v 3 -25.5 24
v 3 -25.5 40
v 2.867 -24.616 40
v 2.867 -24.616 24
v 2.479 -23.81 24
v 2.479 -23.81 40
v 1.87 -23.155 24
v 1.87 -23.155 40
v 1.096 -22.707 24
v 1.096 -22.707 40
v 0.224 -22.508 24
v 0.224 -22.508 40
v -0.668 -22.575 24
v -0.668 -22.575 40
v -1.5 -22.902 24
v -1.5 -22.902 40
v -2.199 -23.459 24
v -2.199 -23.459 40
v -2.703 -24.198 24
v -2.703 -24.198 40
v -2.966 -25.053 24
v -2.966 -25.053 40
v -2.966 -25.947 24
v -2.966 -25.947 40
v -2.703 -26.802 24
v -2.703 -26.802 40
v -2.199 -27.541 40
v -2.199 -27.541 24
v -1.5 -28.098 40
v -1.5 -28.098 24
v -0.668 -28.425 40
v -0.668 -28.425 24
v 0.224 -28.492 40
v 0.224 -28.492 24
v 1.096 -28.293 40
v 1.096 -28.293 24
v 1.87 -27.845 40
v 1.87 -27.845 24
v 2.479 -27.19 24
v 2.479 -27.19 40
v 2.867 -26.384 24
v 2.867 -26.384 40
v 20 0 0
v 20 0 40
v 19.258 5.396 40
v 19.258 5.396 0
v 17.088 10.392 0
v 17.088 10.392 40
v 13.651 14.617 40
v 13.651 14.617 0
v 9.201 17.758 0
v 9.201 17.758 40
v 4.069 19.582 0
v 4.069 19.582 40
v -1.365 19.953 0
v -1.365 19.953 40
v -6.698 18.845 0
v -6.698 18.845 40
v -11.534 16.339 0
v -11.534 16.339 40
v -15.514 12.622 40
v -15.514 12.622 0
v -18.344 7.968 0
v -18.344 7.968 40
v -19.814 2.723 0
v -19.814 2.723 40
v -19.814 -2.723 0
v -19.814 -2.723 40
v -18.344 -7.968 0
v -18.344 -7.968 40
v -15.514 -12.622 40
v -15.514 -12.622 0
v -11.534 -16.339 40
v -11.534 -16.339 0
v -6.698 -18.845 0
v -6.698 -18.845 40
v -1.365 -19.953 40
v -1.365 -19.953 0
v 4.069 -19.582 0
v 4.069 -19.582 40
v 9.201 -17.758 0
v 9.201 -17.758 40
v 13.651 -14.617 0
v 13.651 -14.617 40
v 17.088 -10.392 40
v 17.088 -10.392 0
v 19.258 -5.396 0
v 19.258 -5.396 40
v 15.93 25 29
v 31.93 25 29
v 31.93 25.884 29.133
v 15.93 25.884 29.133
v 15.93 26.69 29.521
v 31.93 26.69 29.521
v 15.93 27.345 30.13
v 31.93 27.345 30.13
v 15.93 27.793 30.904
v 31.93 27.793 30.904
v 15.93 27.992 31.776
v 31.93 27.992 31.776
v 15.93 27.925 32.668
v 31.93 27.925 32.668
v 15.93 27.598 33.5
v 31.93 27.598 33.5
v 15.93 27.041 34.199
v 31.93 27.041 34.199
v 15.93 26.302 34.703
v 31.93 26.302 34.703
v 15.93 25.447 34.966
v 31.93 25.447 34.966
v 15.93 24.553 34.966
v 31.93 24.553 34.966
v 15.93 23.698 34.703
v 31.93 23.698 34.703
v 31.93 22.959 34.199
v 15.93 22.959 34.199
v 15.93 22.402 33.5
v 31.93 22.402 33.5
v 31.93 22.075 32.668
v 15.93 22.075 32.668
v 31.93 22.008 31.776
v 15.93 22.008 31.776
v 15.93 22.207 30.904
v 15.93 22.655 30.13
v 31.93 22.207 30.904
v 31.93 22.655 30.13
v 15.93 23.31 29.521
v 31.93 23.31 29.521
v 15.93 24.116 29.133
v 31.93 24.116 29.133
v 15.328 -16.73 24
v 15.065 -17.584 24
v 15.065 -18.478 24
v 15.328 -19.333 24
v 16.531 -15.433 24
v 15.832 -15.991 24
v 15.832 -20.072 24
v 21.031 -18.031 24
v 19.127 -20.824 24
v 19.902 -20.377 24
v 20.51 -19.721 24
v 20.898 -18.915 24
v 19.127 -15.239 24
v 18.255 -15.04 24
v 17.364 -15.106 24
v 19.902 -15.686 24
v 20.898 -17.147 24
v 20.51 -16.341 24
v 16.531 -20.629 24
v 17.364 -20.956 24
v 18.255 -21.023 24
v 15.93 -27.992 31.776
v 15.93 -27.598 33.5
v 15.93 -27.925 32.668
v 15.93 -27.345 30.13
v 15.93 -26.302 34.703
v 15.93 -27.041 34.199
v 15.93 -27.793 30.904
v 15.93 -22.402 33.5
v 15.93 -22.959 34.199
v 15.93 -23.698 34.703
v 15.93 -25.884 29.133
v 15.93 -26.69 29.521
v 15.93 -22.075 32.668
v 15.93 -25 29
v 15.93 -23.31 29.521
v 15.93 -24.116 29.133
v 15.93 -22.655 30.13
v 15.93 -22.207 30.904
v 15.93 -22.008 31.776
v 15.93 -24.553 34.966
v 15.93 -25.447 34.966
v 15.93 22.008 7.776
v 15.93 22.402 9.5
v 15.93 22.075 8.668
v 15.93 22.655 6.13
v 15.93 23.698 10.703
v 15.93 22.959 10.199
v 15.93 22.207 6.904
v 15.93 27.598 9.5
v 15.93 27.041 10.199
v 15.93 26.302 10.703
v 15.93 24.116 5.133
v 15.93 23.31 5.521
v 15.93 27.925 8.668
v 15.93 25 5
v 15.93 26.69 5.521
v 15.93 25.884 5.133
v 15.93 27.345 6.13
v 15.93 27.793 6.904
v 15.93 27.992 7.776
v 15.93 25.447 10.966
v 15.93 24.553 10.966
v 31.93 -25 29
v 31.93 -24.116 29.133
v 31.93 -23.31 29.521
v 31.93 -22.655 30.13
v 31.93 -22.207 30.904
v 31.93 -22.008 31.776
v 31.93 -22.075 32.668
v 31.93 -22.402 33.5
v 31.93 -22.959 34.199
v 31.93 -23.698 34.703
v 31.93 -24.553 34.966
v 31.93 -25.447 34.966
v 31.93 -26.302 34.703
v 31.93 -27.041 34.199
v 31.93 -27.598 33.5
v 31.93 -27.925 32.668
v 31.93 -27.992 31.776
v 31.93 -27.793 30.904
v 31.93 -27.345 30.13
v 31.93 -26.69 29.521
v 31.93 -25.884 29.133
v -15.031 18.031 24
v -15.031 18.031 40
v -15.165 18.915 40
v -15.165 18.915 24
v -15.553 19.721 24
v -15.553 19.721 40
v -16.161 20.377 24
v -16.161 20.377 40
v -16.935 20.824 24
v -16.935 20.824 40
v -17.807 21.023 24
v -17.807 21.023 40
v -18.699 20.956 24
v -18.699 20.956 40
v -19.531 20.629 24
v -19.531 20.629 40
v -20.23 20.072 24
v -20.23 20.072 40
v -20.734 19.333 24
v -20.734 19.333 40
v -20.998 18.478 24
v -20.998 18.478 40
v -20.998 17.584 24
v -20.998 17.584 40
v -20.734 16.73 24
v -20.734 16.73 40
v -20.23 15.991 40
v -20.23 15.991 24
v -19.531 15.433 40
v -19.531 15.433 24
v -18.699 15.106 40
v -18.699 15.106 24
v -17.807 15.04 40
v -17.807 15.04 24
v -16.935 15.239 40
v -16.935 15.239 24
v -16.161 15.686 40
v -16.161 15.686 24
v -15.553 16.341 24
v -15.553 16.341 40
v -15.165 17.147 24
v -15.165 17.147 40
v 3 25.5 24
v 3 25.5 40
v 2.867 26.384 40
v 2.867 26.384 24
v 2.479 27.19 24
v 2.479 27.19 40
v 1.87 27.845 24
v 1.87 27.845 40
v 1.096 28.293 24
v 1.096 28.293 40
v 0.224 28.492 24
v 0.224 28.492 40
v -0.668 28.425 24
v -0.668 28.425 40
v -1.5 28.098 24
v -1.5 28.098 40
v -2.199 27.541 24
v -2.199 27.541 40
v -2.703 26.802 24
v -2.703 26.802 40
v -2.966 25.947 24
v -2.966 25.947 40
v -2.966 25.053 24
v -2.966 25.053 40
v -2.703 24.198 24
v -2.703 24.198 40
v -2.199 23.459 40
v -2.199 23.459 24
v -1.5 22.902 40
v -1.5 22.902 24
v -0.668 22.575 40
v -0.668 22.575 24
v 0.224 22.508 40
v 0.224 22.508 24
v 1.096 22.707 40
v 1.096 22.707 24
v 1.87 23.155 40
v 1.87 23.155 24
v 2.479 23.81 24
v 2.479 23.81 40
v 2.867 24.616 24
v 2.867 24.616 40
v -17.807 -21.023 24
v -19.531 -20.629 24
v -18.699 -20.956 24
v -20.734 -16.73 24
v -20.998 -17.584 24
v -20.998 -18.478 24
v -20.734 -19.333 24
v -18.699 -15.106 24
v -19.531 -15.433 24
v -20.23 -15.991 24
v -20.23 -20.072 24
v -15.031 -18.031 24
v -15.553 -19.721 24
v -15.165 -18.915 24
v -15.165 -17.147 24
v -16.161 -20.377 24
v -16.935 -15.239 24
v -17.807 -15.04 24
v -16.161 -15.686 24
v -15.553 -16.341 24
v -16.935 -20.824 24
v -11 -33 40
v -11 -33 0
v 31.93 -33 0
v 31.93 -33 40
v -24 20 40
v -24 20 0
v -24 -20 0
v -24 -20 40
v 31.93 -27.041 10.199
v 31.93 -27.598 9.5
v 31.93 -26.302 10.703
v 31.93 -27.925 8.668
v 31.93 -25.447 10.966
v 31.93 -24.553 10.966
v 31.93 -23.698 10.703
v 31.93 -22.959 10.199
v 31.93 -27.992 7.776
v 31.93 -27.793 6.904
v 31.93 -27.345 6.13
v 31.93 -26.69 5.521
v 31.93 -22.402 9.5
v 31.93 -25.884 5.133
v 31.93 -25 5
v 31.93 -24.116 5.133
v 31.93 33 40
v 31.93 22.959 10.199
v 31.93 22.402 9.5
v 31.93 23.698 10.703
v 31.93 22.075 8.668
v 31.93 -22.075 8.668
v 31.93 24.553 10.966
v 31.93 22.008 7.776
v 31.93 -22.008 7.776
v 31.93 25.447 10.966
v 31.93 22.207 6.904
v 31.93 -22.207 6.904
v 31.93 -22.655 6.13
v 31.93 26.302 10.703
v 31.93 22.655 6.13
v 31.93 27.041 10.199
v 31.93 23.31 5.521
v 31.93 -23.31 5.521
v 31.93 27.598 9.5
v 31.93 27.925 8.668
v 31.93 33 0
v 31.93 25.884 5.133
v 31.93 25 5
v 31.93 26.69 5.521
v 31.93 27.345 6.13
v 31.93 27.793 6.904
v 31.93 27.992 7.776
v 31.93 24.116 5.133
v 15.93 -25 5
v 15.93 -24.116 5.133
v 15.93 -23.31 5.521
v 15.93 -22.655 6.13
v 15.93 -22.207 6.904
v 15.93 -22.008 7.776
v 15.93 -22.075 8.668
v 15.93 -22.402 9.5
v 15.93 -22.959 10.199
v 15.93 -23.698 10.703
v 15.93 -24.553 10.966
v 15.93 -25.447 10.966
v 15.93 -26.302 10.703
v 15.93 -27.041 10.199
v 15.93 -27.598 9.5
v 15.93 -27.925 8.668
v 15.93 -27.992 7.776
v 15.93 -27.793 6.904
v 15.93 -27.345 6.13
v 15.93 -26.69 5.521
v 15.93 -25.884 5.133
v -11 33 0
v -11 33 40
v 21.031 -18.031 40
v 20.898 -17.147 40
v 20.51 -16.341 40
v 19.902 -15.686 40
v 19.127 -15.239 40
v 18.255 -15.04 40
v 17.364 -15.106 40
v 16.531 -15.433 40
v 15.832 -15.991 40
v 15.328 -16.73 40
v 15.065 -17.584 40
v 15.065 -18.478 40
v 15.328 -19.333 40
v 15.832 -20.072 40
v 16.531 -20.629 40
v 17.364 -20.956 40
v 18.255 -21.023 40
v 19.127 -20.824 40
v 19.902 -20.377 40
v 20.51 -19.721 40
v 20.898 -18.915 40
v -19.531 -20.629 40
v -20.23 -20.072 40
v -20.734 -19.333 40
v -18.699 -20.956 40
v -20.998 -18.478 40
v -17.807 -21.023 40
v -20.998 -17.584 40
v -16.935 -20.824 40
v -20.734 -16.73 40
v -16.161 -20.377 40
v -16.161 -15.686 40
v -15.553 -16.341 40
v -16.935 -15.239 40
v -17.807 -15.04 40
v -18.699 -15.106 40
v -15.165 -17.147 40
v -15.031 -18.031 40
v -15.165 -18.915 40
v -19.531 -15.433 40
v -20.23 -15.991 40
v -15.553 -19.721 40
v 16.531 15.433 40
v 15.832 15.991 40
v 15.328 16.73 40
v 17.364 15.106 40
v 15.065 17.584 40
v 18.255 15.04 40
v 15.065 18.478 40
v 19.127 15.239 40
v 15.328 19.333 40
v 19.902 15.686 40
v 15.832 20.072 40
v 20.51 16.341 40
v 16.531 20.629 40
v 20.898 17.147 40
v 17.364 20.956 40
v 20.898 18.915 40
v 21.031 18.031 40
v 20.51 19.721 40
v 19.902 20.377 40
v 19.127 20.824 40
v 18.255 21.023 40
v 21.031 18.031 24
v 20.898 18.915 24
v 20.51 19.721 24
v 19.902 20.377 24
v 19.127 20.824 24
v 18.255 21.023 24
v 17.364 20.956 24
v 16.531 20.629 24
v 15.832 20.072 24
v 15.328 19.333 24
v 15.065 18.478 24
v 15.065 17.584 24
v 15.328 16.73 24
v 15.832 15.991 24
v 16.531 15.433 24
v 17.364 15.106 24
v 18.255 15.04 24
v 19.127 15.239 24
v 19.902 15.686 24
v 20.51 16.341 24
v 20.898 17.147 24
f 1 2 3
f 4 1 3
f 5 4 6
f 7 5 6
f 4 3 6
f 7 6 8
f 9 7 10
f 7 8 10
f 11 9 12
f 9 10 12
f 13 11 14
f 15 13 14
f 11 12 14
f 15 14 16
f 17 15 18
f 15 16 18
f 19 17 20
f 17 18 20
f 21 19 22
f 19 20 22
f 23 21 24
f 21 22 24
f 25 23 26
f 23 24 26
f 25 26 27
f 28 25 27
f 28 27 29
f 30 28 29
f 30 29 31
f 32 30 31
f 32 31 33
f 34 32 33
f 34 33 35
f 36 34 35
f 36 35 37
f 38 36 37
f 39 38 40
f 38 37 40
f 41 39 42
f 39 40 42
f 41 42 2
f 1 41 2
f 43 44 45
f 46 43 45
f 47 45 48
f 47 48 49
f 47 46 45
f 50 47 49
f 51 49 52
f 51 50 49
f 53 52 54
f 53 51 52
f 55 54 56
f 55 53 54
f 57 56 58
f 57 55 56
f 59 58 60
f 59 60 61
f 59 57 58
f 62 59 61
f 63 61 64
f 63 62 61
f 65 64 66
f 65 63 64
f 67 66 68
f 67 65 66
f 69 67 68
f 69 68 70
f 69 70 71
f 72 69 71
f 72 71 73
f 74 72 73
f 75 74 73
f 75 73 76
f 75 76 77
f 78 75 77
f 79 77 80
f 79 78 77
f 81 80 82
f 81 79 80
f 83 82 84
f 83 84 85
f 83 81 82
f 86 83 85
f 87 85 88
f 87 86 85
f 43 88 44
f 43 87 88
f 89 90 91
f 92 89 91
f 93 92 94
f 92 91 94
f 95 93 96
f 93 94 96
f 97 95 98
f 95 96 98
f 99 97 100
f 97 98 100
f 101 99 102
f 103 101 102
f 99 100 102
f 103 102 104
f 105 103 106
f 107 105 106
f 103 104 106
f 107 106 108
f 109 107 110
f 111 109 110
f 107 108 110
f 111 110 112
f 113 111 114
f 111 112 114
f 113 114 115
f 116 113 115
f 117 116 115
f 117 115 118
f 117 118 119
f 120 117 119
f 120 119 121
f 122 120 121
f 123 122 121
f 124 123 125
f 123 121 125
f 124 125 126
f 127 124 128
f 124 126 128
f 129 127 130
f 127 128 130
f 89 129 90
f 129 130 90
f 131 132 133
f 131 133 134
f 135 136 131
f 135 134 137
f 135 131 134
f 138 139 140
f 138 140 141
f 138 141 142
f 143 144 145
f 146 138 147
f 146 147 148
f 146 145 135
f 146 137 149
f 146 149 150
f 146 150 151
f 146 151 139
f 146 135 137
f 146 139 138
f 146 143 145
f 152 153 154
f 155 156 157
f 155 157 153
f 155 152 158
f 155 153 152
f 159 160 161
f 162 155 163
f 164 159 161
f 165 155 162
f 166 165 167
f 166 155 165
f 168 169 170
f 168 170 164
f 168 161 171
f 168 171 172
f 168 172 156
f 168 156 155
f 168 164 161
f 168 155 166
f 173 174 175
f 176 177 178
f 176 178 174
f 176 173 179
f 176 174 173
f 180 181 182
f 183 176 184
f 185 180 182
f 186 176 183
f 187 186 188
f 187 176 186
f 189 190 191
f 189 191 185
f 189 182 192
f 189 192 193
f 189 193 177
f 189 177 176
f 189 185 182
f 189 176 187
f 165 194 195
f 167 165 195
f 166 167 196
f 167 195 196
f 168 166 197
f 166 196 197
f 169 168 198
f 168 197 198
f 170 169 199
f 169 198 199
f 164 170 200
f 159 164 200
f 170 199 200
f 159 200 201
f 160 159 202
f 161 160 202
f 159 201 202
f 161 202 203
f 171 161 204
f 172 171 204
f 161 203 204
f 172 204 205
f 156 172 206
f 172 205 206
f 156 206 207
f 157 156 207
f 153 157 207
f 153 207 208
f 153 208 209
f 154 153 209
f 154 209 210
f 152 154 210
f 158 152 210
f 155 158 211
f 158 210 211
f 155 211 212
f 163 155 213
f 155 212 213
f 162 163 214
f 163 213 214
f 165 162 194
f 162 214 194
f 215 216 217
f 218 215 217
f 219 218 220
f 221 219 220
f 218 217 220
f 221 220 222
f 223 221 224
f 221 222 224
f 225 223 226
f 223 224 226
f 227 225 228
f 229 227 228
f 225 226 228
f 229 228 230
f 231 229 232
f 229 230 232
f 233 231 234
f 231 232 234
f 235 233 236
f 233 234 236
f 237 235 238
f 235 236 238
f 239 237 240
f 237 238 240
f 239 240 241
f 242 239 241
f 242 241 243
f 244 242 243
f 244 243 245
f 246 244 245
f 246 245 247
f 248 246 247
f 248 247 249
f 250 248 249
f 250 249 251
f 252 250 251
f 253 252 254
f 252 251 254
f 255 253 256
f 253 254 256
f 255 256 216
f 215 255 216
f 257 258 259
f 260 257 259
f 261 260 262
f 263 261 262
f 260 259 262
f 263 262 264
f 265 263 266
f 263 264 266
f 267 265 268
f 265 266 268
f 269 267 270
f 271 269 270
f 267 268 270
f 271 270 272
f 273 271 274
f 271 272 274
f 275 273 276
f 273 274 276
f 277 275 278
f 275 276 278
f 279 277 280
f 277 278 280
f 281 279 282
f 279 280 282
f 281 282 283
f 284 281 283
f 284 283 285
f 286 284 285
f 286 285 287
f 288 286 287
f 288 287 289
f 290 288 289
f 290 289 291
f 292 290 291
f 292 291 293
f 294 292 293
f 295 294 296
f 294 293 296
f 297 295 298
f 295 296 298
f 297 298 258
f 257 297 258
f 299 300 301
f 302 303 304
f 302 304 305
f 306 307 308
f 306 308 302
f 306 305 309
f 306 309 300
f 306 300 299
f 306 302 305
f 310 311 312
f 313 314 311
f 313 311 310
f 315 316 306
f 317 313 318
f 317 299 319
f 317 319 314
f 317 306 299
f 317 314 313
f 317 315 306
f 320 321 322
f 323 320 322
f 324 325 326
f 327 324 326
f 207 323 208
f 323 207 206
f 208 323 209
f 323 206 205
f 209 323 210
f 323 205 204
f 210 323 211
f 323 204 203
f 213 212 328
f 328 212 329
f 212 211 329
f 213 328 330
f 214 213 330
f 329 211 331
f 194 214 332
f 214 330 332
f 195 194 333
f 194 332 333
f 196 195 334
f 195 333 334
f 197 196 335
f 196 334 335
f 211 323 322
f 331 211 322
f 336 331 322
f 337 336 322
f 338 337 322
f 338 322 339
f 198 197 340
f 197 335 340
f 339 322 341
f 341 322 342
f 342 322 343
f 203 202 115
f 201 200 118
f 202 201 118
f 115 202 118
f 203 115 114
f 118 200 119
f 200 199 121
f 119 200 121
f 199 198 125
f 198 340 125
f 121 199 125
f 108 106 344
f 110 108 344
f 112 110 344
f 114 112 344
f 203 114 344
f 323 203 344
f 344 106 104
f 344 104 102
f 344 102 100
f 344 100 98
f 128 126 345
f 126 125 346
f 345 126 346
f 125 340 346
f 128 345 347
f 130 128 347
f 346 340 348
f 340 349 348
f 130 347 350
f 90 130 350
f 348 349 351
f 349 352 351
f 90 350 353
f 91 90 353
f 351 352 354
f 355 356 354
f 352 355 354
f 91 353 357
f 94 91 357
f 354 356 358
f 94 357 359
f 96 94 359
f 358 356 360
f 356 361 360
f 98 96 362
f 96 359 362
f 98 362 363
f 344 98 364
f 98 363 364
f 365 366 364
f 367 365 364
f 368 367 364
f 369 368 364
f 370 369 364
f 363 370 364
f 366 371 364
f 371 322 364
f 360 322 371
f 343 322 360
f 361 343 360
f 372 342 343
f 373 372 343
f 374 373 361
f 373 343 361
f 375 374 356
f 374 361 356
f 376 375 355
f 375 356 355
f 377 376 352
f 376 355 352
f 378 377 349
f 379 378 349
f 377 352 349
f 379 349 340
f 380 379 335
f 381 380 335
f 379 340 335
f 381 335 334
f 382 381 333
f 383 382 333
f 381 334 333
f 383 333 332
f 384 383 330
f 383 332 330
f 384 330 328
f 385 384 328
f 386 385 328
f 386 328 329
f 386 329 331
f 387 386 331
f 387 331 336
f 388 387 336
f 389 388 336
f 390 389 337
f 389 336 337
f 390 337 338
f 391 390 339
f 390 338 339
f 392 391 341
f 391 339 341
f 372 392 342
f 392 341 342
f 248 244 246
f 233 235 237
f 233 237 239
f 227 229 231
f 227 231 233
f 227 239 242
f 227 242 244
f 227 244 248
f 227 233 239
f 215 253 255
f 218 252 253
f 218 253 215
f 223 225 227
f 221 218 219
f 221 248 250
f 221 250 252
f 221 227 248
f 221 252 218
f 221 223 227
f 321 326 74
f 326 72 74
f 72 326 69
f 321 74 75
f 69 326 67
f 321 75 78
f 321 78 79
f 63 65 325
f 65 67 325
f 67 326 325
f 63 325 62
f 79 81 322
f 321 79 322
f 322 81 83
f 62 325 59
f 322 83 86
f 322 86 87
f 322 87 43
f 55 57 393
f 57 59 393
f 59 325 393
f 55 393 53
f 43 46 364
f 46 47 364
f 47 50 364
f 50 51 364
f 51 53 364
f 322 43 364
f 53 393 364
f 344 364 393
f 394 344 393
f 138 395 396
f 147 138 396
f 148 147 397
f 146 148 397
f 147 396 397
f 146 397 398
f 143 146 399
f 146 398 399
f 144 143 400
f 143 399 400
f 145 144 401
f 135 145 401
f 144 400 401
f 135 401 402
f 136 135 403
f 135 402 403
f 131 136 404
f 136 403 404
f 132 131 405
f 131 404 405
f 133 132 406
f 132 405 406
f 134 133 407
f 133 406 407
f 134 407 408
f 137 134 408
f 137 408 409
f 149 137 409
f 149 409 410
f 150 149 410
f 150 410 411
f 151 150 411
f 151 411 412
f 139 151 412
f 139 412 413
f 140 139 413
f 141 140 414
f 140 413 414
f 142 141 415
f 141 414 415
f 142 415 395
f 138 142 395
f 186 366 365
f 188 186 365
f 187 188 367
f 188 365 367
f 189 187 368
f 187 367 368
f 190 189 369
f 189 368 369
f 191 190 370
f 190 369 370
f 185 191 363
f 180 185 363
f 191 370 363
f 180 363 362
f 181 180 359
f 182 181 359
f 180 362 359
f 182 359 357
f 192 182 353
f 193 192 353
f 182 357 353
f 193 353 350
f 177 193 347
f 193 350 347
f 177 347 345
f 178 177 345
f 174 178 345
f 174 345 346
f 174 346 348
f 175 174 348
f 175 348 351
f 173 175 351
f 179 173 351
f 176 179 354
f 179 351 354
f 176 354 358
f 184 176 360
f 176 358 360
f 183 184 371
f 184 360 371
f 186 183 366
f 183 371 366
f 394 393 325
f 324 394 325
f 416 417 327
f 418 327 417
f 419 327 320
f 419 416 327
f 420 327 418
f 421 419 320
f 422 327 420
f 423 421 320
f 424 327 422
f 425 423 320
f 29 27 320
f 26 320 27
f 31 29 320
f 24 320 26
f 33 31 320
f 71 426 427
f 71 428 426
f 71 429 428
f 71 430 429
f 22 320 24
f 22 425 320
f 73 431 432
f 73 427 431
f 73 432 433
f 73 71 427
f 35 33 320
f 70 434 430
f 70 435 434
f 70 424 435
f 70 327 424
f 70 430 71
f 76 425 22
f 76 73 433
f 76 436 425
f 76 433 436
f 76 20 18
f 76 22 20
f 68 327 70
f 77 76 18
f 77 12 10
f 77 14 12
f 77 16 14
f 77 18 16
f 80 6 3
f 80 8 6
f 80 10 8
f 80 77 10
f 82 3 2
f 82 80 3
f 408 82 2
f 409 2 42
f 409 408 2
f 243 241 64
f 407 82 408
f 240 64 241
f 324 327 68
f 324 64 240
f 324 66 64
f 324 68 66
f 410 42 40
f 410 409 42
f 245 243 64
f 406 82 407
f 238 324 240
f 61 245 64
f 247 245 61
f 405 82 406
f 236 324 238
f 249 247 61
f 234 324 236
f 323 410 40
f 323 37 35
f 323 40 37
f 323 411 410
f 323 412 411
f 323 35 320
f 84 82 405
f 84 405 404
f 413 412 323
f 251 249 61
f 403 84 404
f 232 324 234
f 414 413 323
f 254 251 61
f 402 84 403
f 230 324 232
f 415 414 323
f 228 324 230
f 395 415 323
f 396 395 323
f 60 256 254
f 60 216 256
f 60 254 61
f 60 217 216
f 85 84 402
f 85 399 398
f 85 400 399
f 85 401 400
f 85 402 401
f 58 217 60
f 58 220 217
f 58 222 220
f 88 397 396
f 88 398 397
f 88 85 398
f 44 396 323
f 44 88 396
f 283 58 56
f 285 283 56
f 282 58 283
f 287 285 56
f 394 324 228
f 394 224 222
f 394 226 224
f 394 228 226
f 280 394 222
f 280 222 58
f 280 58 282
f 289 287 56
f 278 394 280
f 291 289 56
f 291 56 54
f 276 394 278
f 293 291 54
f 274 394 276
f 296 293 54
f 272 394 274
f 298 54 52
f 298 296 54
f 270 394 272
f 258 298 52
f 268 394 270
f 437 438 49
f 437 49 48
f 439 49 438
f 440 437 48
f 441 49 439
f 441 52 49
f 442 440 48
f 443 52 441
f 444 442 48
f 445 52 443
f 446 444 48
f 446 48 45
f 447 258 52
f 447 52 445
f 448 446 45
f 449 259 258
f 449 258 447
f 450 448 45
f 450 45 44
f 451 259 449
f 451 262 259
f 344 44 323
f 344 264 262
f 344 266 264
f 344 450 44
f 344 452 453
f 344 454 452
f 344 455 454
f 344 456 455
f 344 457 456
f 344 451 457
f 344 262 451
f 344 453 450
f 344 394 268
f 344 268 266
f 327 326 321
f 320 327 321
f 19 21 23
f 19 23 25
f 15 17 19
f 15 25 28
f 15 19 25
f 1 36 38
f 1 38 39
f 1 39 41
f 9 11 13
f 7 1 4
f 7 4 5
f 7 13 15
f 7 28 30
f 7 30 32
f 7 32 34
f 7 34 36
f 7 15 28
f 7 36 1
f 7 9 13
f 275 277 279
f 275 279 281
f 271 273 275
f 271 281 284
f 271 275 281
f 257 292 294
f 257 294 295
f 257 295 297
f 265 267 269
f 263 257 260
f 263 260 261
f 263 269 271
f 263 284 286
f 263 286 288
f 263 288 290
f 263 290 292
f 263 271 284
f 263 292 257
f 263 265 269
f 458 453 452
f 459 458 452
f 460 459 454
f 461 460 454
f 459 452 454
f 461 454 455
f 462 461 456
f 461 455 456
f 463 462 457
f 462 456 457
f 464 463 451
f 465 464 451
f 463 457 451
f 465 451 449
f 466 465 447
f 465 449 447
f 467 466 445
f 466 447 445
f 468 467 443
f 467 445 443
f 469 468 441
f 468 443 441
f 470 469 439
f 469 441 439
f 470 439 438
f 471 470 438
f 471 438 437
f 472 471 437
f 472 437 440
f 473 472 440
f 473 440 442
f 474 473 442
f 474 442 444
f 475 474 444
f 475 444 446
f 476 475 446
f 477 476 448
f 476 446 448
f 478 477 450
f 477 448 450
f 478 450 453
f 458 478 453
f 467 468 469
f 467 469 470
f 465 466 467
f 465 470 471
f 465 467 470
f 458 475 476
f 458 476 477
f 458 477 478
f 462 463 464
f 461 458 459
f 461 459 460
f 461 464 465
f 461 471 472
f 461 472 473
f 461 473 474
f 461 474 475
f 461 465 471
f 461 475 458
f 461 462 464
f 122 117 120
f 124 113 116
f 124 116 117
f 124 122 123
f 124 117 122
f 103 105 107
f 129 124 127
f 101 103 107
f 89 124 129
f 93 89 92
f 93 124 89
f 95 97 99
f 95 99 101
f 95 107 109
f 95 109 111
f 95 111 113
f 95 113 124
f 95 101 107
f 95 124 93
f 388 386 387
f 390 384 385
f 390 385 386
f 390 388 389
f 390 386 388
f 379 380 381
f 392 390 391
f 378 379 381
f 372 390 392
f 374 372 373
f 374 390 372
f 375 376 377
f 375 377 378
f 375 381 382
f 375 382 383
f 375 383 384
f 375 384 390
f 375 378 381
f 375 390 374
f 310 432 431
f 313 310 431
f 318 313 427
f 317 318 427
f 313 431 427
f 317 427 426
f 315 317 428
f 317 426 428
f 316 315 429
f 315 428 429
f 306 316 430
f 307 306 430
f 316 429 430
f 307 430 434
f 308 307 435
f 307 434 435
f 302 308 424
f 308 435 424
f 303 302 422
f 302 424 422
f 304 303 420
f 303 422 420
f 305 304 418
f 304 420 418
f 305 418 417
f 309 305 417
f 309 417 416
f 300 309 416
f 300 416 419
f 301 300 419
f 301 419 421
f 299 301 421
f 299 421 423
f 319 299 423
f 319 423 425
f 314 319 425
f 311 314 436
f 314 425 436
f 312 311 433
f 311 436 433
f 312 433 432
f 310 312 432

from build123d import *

# Parameters (mm, degrees)
SKETCH1_R           = 20
BOSS_EXTRUDE2_DEPTH = 40
SKETCH8_R           = 3
CUT_EXTRUDE1_DEPTH  = 16
SKETCH9_R           = 3
CUT_EXTRUDE2_DEPTH  = 16


with BuildPart() as part:
    # Sketch1 → Boss-Extrude2 (new body)
    with BuildSketch(Plane.XY):
        Polygon((-24, -20), (-11, -33), (31.93, -33), (31.93, 33), (-11, 33), (-24, 20), align=None)
        Circle(SKETCH1_R, mode=Mode.SUBTRACT)
    extrude(amount=BOSS_EXTRUDE2_DEPTH)

    # Sketch8 → Cut-Extrude1 (cut)
    with BuildSketch(Plane.XY.offset(40)):
        with Locations((0, 25.5)):
            Circle(SKETCH8_R)
        with Locations((18.03122292, 18.03122292)):
            Circle(SKETCH8_R)
        with Locations((18.03122292, -18.03122292)):
            Circle(SKETCH8_R)
        with Locations((0, -25.5)):
            Circle(SKETCH8_R)
        with Locations((-18.03122292, -18.03122292)):
            Circle(SKETCH8_R)
        with Locations((-18.03122292, 18.03122292)):
            Circle(SKETCH8_R)
    extrude(amount=-CUT_EXTRUDE1_DEPTH, mode=Mode.SUBTRACT)

    # Sketch9 → Cut-Extrude2 (cut)
    with BuildSketch(Plane(origin=(31.93, 0, 0), x_dir=(0, 0, -1), z_dir=(1, 0, 0))):
        with Locations((-32, 25)):
            Circle(SKETCH9_R)
        with Locations((-8, 25)):
            Circle(SKETCH9_R)
        with Locations((-8, -25)):
            Circle(SKETCH9_R)
        with Locations((-32, -25)):
            Circle(SKETCH9_R)
    extrude(amount=-CUT_EXTRUDE2_DEPTH, mode=Mode.SUBTRACT)


solid = part.part
